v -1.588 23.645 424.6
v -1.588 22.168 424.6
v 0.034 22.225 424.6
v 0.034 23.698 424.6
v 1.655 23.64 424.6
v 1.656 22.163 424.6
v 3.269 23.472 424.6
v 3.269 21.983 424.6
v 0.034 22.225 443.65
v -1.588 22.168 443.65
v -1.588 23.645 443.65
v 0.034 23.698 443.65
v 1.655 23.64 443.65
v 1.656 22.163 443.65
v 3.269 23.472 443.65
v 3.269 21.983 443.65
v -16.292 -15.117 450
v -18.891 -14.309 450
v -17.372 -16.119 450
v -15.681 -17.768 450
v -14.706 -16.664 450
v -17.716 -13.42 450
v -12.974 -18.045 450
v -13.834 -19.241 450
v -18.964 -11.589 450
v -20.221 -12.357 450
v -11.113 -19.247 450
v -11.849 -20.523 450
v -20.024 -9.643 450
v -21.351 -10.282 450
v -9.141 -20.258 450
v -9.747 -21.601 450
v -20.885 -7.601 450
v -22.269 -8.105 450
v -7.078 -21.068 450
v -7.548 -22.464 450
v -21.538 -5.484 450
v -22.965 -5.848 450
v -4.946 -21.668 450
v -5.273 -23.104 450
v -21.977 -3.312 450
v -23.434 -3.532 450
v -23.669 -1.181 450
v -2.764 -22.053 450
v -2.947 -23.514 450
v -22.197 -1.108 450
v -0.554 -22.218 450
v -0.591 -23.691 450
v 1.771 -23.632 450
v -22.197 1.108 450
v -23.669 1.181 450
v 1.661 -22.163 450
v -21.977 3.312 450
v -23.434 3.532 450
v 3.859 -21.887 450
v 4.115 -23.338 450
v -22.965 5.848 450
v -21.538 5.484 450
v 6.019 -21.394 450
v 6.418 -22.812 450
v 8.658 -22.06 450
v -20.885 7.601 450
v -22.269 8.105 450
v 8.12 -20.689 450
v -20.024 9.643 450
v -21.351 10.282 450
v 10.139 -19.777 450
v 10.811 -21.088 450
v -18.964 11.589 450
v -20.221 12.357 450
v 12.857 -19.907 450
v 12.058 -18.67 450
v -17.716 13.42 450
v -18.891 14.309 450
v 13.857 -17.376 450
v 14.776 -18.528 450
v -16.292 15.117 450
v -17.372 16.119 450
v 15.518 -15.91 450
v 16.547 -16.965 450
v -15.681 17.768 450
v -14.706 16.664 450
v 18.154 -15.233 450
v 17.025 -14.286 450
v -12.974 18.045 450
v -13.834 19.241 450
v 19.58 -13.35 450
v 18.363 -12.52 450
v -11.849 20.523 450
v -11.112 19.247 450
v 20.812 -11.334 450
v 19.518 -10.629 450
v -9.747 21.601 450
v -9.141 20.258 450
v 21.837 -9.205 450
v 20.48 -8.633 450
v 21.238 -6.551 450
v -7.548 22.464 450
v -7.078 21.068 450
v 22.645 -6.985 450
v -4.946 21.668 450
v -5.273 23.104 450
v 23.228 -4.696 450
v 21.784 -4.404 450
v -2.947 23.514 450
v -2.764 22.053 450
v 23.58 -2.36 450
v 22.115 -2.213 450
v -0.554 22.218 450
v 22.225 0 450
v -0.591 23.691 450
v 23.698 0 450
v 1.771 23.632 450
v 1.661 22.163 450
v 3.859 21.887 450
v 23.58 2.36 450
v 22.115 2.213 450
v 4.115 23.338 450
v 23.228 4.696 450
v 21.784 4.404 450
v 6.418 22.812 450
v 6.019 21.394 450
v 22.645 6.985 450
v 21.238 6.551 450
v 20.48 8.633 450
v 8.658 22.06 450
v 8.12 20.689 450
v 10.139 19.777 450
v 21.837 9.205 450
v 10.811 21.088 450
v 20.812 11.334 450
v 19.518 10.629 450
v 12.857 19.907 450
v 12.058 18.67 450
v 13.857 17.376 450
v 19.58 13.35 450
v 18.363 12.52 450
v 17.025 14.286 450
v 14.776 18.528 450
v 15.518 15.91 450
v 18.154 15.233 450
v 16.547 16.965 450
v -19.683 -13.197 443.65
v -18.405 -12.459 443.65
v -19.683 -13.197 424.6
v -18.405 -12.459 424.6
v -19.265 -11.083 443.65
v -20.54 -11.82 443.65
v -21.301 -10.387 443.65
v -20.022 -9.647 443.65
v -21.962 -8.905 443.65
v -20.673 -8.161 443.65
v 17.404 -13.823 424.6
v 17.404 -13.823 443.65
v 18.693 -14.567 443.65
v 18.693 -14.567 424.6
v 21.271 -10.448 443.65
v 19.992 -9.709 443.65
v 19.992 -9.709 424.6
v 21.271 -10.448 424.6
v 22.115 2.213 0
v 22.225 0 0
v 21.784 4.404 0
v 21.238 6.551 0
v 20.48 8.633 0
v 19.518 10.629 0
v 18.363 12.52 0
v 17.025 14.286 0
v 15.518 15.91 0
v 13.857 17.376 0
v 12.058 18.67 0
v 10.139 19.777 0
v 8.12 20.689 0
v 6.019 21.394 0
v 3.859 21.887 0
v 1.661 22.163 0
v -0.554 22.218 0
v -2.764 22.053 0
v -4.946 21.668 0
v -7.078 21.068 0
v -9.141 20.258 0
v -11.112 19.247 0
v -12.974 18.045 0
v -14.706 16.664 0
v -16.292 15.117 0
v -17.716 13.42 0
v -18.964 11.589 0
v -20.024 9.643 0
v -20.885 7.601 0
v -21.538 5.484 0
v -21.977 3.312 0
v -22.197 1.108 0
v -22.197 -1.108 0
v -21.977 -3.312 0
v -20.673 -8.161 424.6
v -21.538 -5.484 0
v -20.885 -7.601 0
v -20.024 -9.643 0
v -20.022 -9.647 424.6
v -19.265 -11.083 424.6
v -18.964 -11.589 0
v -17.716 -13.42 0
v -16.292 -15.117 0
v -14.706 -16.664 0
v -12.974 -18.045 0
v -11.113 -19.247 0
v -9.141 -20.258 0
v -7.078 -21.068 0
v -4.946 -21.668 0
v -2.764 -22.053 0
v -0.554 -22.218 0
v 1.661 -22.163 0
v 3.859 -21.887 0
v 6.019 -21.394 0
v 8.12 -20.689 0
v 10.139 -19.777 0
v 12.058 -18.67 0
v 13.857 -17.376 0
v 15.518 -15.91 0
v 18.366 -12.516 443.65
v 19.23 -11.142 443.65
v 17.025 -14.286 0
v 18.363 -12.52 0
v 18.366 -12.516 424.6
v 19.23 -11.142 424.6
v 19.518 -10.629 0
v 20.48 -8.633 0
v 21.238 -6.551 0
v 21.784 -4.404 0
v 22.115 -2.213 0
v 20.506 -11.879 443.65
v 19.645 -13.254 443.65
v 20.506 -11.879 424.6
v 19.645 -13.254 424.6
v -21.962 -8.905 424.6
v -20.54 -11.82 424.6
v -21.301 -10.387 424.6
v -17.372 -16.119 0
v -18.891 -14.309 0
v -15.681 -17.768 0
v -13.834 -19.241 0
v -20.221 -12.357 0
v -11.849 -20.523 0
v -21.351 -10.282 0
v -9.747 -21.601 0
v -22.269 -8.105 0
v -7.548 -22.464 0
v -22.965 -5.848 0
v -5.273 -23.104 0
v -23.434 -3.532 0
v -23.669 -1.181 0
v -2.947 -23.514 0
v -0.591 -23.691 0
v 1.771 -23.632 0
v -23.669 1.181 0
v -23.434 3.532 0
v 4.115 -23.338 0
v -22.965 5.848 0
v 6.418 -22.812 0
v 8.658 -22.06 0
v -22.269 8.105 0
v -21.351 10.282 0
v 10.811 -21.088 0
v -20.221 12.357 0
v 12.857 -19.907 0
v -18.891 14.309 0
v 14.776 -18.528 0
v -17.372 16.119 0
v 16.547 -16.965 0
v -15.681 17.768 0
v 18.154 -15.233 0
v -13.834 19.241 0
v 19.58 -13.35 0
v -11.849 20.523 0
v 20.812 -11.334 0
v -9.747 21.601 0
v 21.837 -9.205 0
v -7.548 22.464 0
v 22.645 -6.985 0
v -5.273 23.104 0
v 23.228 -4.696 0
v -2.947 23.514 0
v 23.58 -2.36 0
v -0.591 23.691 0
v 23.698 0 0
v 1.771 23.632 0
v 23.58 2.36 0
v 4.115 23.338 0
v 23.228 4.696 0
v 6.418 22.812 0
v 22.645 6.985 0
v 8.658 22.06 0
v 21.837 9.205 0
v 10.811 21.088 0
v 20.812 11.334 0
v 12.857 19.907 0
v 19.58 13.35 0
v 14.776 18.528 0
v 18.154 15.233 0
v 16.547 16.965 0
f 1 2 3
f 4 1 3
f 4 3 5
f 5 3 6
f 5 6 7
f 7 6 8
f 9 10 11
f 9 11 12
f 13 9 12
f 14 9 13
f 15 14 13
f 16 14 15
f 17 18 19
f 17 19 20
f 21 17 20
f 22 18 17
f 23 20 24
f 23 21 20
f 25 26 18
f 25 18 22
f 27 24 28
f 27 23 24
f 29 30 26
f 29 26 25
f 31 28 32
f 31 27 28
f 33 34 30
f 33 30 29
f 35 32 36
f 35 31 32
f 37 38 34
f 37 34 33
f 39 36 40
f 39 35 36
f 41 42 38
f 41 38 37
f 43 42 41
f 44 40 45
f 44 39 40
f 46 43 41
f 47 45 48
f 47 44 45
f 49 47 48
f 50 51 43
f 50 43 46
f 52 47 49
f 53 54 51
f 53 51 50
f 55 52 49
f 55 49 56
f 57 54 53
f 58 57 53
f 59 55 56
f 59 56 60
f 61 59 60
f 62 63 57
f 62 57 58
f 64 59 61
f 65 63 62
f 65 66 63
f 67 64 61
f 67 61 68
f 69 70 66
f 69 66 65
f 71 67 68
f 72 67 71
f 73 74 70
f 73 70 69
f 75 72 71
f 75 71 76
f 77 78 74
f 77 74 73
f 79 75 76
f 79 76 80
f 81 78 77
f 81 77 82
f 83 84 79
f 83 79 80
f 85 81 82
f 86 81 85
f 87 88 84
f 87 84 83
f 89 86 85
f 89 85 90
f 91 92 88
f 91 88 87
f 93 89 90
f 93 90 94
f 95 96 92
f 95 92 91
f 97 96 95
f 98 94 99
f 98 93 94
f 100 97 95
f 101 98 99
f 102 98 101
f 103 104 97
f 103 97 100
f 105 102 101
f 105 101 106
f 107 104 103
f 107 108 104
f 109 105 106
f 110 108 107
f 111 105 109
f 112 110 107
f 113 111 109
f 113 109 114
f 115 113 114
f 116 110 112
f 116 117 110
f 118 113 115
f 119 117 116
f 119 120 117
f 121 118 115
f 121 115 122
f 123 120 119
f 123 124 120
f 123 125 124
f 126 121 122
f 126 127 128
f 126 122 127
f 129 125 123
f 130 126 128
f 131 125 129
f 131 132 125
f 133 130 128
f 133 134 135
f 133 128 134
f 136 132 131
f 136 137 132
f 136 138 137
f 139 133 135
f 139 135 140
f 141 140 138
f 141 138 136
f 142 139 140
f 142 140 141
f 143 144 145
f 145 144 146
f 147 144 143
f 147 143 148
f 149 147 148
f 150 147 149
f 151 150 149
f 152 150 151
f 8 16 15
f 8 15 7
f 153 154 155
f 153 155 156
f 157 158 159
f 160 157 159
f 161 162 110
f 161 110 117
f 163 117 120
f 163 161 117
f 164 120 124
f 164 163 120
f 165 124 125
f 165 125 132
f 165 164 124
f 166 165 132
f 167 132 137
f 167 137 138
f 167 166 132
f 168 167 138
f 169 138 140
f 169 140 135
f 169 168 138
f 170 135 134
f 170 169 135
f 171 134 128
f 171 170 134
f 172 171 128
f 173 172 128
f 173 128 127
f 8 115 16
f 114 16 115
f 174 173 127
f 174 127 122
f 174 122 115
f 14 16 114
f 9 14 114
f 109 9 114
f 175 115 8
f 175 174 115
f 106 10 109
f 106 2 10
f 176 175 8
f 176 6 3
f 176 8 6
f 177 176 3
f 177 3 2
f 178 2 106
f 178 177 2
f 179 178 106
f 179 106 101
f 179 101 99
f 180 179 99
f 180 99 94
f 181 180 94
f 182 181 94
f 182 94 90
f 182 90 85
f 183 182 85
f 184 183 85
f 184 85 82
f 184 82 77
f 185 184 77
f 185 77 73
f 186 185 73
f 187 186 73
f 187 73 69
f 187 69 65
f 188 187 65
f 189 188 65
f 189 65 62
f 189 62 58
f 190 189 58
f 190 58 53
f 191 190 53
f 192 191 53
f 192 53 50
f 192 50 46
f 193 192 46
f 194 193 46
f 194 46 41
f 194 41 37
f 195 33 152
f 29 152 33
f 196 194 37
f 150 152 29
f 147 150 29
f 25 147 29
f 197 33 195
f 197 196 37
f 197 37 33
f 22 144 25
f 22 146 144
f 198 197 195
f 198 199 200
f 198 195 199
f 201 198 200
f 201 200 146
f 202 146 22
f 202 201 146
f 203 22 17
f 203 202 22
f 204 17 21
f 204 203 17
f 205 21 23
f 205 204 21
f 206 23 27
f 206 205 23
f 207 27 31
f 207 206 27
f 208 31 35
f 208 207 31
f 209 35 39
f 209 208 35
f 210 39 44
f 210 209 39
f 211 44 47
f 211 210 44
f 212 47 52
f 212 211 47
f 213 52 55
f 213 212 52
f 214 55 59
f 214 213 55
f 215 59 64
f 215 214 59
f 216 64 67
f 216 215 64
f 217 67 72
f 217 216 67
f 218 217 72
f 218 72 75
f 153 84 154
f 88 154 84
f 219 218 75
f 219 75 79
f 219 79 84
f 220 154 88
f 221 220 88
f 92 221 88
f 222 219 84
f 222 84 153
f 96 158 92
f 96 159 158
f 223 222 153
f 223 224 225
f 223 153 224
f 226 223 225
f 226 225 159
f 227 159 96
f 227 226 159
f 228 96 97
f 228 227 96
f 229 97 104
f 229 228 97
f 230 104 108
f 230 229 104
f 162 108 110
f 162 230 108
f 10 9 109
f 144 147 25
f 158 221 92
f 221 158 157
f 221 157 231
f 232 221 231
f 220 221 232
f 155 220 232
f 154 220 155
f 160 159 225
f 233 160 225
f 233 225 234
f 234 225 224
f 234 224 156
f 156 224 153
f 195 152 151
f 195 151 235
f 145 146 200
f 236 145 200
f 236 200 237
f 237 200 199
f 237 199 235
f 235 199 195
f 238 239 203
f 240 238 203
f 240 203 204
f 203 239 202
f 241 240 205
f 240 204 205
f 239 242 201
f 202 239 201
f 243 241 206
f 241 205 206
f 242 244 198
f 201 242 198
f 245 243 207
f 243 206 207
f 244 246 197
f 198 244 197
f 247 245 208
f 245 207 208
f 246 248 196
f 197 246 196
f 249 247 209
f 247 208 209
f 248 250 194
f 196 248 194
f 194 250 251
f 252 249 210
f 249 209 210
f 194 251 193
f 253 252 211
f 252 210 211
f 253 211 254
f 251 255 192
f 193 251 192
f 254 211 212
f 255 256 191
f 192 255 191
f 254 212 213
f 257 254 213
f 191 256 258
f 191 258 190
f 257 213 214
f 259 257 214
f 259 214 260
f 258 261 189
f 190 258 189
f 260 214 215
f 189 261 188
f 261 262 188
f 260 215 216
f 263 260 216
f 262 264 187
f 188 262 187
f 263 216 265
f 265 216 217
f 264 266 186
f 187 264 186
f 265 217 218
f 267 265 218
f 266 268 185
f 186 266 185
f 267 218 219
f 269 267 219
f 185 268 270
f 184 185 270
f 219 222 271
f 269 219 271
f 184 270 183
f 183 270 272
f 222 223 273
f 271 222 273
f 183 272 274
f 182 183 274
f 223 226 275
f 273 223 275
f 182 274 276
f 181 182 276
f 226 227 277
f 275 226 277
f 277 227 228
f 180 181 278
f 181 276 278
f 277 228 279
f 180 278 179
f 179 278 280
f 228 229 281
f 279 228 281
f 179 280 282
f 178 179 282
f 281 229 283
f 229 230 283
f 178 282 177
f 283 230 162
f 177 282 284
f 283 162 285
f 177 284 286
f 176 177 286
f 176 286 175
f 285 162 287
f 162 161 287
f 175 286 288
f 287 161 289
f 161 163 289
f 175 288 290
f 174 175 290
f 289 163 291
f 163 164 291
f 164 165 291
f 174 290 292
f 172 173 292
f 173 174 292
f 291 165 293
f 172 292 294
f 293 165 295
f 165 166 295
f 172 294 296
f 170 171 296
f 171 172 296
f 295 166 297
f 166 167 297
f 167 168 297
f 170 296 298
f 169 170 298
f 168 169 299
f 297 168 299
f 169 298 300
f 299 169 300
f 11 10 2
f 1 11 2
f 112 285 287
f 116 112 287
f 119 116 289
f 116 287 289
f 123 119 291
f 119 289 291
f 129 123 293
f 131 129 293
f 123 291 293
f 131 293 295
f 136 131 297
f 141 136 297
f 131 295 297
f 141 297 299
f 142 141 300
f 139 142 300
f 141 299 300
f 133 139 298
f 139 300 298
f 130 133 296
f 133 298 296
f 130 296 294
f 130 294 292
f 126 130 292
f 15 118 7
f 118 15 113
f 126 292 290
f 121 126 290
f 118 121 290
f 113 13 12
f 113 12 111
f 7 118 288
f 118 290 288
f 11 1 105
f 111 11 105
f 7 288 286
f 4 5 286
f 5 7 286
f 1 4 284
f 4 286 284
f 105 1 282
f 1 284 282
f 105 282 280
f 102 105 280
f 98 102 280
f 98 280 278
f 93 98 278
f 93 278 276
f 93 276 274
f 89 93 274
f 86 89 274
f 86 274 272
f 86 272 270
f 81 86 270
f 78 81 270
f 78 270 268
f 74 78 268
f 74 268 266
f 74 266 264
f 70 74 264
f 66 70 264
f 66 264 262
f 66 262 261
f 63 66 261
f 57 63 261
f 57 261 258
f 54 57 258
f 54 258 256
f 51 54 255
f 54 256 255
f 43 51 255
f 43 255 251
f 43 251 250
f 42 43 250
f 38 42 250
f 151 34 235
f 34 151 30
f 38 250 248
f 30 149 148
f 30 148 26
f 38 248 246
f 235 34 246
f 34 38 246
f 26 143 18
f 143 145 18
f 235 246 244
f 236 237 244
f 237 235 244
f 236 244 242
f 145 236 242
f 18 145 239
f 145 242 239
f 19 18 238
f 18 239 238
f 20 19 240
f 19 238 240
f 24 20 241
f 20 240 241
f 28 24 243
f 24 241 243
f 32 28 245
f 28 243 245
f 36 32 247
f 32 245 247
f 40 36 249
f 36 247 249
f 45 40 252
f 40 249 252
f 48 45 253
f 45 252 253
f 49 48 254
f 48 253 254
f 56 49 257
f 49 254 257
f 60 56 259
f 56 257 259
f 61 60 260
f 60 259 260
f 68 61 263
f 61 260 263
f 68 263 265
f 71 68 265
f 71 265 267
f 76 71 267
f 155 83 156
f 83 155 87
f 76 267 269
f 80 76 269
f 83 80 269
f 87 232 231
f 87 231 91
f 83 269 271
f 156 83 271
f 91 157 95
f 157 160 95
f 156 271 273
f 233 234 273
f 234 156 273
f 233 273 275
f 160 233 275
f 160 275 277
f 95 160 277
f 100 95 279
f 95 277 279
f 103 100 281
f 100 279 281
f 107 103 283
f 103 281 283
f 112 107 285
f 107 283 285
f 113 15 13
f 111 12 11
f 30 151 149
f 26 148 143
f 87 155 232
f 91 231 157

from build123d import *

# Parameters (mm, degrees)
SKETCH1_R           = 23.6982
SKETCH1_R_2         = 22.225
BOSS_EXTRUDE1_DEPTH = 450
CUT_EXTRUDE2_START  = -28.81672
SKETCH3_W           = 4.856446364
SKETCH3_H           = 19.05
CUT_EXTRUDE2_DEPTH  = 1.71492
CIRPATTERN4_COUNT   = 3


with BuildPart() as part:
    # Sketch1 → Boss-Extrude1 (new body)
    with BuildSketch(Plane.XY):
        Circle(SKETCH1_R)
        Circle(SKETCH1_R_2, mode=Mode.SUBTRACT)
    extrude(amount=BOSS_EXTRUDE1_DEPTH)

    # Sketch3 → Cut-Extrude2 (cut)
    with BuildSketch(Plane(origin=(0, 50.8, 0), x_dir=(1, 0, 0), z_dir=(0, 1, 0)).offset(CUT_EXTRUDE2_START)):
        with Locations((0.840723182, -434.125)):
            Rectangle(SKETCH3_W, SKETCH3_H)
    cut_extrude2 = extrude(amount=CUT_EXTRUDE2_DEPTH, mode=Mode.SUBTRACT)

    # CirPattern4: Cut-Extrude2 ×3 about axis
    cirpattern4_axis = Axis((0, 0, 0), (0, 0, 1))
    for i in range(1, CIRPATTERN4_COUNT):
        add(cut_extrude2.rotate(cirpattern4_axis, i * 360 / CIRPATTERN4_COUNT), mode=Mode.SUBTRACT)


solid = part.part
